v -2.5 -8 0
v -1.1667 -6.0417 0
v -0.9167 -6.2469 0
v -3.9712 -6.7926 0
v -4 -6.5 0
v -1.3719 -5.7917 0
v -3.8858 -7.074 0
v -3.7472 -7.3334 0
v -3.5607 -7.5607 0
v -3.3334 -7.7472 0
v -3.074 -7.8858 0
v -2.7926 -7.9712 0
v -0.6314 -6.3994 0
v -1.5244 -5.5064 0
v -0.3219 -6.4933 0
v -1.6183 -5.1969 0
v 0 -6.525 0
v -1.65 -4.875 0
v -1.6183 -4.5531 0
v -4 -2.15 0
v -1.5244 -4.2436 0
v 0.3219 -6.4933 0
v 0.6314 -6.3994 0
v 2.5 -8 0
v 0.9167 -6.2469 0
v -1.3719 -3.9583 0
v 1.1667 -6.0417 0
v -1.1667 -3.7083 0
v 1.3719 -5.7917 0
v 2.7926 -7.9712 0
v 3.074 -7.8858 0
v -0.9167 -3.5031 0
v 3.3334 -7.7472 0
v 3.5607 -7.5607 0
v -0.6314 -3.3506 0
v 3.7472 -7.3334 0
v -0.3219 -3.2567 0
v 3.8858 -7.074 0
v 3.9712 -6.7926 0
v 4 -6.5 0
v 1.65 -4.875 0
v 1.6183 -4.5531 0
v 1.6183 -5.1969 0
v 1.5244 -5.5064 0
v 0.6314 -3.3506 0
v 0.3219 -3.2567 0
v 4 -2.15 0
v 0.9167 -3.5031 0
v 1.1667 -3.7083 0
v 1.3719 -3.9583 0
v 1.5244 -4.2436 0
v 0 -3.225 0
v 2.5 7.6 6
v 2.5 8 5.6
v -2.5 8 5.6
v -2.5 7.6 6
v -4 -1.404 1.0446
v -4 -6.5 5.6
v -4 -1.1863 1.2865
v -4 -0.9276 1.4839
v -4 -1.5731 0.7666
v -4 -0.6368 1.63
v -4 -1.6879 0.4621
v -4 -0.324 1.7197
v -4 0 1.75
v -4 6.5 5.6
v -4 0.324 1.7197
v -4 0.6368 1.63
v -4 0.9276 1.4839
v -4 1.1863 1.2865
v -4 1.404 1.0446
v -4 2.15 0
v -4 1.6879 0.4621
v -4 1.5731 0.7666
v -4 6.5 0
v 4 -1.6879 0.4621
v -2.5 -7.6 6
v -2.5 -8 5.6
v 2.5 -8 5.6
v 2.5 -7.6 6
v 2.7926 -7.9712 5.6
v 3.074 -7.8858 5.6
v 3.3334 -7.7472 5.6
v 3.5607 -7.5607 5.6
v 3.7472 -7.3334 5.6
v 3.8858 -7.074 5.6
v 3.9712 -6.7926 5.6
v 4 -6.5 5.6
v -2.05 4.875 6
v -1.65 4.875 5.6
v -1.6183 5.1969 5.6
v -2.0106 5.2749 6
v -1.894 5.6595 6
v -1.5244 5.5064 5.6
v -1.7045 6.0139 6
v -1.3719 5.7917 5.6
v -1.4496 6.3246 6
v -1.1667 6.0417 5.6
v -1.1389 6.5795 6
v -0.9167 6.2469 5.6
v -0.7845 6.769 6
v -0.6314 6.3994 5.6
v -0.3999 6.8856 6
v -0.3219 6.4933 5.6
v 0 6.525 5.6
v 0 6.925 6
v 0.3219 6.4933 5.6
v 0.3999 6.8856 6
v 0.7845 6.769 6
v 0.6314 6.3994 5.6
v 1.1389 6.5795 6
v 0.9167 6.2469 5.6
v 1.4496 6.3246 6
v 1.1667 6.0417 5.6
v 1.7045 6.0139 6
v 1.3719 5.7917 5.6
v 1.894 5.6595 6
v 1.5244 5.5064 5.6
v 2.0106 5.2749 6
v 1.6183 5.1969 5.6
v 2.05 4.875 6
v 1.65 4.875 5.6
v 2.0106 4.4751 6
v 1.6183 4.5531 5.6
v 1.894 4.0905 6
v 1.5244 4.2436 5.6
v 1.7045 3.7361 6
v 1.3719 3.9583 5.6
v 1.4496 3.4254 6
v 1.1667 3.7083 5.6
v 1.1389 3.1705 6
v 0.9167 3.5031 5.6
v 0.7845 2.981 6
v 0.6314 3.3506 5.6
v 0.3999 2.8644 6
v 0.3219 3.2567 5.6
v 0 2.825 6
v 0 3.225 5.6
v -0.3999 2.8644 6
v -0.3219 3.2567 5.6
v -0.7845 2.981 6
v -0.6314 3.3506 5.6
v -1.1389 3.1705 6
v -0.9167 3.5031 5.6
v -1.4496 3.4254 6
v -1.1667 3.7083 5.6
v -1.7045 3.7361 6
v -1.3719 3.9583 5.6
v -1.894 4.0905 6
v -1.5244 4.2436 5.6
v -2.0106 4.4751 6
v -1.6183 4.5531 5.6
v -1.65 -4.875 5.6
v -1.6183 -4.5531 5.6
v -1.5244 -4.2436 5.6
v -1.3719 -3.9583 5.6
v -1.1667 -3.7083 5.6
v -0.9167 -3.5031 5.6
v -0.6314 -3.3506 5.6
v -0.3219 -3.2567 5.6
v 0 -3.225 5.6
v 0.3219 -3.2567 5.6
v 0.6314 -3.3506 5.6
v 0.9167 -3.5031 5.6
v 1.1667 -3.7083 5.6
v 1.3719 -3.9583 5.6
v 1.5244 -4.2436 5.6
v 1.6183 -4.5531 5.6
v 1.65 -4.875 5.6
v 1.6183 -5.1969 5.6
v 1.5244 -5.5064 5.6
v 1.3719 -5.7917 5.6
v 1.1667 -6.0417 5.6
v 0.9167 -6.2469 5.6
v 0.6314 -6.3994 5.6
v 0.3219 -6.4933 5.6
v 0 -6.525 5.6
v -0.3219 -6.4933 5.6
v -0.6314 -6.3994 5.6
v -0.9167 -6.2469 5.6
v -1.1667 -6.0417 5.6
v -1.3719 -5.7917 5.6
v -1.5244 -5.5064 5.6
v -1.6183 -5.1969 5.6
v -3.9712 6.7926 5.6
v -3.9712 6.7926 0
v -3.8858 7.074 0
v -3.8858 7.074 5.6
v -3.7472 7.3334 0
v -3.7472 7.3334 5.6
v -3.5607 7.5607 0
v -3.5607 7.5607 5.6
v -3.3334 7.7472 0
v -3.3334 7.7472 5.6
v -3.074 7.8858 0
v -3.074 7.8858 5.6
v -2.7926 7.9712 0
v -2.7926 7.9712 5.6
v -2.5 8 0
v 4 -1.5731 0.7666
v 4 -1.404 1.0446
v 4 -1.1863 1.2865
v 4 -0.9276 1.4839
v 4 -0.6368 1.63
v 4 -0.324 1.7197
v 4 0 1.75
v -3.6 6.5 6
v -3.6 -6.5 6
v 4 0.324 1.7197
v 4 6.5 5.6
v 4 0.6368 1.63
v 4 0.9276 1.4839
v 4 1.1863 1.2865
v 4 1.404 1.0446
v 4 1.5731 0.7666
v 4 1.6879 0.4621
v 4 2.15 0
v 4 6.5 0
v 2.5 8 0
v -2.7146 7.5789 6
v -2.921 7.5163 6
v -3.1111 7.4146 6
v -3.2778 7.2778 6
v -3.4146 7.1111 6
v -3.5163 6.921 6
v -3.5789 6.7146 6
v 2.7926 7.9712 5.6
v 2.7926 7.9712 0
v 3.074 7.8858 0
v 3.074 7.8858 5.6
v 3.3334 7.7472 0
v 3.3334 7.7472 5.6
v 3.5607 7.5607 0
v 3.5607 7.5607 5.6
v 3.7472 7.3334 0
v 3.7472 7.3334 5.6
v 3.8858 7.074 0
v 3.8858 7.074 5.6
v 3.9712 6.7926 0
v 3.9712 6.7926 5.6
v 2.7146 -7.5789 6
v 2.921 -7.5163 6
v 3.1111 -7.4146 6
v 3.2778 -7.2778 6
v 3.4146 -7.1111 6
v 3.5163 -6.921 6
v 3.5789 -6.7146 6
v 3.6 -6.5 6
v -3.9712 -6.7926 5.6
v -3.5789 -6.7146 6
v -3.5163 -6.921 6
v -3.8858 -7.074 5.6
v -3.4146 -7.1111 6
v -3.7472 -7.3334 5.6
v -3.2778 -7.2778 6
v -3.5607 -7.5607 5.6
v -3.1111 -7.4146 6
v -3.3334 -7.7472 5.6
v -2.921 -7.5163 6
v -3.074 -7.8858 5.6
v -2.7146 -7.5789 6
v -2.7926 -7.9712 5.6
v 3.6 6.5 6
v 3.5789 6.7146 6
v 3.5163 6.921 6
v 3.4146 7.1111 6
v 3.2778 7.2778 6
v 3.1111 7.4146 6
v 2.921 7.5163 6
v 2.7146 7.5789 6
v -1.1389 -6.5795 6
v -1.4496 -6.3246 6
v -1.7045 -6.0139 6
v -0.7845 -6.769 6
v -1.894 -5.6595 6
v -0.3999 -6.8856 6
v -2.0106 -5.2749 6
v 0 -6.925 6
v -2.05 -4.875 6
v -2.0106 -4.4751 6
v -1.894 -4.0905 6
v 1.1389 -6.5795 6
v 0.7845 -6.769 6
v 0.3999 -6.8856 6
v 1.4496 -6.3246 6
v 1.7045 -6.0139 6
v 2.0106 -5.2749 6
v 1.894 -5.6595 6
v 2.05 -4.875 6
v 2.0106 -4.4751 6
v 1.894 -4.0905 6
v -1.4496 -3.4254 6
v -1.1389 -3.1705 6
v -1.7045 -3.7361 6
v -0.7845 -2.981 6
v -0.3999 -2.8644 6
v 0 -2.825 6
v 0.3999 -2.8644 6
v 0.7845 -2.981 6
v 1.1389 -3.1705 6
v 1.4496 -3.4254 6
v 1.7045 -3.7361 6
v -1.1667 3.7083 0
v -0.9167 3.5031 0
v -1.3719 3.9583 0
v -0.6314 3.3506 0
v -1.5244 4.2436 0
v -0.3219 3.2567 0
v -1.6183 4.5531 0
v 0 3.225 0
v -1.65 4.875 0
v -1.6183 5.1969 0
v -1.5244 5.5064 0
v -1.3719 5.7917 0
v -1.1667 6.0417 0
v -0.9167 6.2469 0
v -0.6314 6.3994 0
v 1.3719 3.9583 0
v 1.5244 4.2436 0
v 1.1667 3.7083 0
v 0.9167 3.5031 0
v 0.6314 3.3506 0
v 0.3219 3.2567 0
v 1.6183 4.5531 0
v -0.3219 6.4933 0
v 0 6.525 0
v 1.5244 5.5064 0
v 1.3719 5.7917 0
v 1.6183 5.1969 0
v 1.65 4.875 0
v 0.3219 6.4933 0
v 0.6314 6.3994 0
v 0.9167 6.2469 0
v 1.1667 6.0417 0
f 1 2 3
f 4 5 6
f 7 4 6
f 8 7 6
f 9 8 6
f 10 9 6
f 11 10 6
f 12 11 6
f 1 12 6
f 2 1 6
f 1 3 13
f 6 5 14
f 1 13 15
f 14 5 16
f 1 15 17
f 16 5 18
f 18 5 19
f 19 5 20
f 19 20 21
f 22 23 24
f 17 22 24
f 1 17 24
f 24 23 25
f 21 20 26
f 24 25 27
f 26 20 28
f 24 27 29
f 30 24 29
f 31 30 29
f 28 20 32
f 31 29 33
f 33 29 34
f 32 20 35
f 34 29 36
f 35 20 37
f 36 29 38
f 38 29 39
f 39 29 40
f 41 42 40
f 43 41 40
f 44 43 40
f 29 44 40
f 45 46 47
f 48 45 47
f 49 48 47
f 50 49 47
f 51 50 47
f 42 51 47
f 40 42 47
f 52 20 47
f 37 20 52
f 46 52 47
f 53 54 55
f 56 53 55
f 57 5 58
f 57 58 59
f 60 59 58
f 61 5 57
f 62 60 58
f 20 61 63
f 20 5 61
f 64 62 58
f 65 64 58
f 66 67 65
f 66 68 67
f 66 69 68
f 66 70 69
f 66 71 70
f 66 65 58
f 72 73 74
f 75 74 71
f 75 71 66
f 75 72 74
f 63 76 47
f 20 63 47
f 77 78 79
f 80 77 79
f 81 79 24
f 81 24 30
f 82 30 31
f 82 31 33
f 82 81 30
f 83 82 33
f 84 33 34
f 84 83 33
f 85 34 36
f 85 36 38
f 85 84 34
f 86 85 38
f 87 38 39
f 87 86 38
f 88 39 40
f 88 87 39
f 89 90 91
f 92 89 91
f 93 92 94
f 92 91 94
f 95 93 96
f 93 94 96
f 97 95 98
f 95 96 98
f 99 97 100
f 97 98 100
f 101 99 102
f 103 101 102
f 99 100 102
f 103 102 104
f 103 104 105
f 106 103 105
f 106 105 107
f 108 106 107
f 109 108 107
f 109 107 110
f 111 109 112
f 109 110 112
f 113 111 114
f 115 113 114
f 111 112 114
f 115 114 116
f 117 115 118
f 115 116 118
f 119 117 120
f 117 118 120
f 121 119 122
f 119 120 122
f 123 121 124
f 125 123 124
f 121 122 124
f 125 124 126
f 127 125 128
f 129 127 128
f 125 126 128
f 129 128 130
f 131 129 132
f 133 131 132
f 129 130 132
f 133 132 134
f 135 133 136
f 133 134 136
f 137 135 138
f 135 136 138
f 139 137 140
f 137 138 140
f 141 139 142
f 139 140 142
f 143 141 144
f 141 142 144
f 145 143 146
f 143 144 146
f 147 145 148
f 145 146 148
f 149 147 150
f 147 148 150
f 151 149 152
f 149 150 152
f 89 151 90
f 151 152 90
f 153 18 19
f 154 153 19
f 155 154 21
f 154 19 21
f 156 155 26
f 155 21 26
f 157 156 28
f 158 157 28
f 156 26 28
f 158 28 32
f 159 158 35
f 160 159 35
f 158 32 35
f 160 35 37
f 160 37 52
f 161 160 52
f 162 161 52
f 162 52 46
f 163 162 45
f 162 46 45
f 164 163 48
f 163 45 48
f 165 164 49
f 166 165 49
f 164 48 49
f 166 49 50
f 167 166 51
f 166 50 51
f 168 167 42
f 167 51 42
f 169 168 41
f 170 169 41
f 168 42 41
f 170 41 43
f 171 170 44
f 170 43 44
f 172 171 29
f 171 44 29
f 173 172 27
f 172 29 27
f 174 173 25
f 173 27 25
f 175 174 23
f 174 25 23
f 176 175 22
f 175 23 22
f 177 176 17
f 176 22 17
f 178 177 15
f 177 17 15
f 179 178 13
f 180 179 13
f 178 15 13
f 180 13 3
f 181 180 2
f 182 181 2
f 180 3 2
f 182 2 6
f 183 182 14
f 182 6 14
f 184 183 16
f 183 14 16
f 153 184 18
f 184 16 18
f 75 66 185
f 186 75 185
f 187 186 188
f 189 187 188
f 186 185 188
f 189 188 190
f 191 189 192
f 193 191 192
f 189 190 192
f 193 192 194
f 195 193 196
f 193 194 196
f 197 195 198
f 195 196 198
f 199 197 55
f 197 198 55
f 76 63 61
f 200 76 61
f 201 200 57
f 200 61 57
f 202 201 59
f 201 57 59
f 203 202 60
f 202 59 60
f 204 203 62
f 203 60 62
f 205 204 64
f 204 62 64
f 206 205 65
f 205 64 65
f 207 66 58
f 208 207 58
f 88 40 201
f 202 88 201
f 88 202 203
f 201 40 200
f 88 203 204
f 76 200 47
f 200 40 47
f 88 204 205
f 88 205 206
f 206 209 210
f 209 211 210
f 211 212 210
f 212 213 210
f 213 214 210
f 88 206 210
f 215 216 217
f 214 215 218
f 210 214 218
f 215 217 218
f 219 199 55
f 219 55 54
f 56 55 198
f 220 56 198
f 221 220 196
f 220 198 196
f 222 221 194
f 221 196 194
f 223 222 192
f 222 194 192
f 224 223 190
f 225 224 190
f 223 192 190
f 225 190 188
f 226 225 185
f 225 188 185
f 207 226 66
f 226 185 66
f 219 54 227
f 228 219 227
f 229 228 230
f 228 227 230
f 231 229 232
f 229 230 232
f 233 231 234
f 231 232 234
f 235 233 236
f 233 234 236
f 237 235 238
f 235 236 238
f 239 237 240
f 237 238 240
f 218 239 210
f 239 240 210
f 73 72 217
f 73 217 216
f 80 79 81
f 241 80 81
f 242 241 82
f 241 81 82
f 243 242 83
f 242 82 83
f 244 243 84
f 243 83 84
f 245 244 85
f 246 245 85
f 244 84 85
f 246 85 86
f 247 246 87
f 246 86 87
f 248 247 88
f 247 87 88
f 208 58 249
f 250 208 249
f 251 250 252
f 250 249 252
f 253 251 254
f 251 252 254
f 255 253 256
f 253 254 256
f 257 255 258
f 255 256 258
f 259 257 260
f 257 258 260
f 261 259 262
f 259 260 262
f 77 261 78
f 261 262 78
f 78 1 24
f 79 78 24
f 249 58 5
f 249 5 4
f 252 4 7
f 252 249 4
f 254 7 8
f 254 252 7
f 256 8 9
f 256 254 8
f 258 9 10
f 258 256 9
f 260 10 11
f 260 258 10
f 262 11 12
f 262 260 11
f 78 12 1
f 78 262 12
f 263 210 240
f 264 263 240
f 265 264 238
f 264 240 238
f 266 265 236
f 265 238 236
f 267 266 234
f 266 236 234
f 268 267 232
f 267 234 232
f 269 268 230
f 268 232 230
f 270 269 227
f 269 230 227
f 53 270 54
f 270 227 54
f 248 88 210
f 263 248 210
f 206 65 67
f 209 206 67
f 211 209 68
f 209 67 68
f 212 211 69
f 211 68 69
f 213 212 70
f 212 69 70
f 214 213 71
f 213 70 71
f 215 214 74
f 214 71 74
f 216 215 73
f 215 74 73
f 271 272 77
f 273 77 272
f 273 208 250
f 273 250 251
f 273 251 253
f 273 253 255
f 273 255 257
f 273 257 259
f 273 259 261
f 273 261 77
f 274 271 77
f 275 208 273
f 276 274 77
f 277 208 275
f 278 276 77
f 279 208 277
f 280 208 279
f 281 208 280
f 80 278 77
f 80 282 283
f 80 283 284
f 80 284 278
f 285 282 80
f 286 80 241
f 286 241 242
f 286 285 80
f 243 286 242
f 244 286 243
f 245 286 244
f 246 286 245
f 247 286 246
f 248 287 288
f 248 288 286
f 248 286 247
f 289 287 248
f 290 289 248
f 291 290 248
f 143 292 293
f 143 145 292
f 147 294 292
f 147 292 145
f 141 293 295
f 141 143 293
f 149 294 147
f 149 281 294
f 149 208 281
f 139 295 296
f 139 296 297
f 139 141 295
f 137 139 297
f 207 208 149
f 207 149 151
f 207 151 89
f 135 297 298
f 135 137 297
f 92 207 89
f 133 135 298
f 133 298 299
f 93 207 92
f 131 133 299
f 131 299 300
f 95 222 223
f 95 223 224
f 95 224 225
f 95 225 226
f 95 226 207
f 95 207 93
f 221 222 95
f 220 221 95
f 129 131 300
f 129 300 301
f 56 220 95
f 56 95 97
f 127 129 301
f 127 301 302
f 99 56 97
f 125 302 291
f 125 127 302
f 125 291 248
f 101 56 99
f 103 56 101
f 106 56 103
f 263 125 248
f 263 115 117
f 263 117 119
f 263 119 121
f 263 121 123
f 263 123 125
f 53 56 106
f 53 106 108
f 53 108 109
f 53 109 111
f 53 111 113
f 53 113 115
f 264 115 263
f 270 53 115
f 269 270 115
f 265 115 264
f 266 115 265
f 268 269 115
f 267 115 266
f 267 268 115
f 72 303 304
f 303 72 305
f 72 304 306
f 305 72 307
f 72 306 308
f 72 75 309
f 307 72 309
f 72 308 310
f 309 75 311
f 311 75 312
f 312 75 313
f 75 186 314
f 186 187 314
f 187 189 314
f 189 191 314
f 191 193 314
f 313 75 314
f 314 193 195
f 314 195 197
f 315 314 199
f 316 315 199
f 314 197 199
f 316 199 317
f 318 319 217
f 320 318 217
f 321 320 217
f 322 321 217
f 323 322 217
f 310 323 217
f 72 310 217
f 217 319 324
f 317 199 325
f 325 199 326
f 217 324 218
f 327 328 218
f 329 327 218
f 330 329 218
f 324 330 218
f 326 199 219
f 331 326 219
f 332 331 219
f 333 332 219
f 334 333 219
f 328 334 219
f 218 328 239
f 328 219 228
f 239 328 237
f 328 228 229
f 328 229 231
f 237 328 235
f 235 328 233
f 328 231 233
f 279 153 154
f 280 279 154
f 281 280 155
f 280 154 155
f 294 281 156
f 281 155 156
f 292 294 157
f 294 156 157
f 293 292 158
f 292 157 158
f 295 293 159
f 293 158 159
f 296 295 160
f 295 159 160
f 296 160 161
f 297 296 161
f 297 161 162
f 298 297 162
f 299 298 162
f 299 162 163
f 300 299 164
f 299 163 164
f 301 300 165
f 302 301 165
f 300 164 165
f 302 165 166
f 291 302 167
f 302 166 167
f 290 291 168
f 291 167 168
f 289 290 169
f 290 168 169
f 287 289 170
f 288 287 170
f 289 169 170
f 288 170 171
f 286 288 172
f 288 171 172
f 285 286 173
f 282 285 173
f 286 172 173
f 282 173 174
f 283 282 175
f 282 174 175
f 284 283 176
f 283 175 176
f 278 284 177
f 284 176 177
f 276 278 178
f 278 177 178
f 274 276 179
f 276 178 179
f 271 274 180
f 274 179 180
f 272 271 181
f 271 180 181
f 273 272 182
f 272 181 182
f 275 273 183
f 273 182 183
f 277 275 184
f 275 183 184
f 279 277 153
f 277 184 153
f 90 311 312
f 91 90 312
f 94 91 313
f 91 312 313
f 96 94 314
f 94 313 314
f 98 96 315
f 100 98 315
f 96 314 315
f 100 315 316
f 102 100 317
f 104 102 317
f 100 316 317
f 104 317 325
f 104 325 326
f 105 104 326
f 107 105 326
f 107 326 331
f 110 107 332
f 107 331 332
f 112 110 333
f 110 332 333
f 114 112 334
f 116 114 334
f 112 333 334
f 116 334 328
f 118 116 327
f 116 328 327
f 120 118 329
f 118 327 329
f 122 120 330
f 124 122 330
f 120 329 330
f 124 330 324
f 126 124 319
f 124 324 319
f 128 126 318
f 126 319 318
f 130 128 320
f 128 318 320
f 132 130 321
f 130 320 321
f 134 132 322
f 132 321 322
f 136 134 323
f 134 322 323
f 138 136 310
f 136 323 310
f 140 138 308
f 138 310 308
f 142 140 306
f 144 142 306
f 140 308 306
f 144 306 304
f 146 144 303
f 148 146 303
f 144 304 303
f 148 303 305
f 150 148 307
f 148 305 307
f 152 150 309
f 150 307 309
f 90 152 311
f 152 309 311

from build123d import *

# Parameters (mm, degrees)
SKETCH2_W           = 8
SKETCH2_H           = 16
BOSS_EXTRUDE1_DEPTH = 6
CUT_EXTRUDE1_DEPTH  = 8
SKETCH4_R           = 1.65
CUT_EXTRUDE2_DEPTH  = 6
FILLET1_R           = 1.5
CHAMFER1_SIZE       = 0.4
CHAMFER2_SIZE       = 0.4


with BuildPart() as part:
    # Sketch2 → Boss-Extrude1 (new body)
    with BuildSketch(Plane.XY):
        Rectangle(SKETCH2_W, SKETCH2_H)
    extrude(amount=BOSS_EXTRUDE1_DEPTH)

    # Sketch3 → Cut-Extrude1 (cut)
    with BuildSketch(Plane.ZY.offset(4)):
        with BuildLine():
            ThreePointArc((0, 1.75), (-1.75, 0), (0, -1.75))
            Line((0, -1.75), (0, 1.75))
        make_face()
        with BuildLine():
            Line((0, 1.75), (0, -1.75))
            ThreePointArc((0, -1.75), (1.237436867, -1.237436867), (1.75, 0))
            ThreePointArc((1.75, 0), (1.237436867, 1.237436867), (0, 1.75))
        make_face()
    extrude(amount=-CUT_EXTRUDE1_DEPTH, mode=Mode.SUBTRACT)

    # Sketch4 → Cut-Extrude2 (cut)
    with BuildSketch(Plane(origin=(0, 0, 0), x_dir=(-1, 0, 0), z_dir=(0, 0, -1))):
        with Locations((0, -4.875)):
            Circle(SKETCH4_R)
        with Locations((0, 4.875)):
            Circle(SKETCH4_R)
    extrude(amount=-CUT_EXTRUDE2_DEPTH, mode=Mode.SUBTRACT)

    # Fillet1
    fillet1_edges = [part.edges().sort_by_distance(p)[0] for p in [
        (4, -8, 3),
        (-4, -8, 3),
        (-4, 8, 3),
        (4, 8, 3),
    ]]
    fillet(fillet1_edges, radius=FILLET1_R)

    # Chamfer1
    chamfer1_edges = [part.edges().sort_by_distance(p)[0] for p in [
        (1.65, -4.875, 6),
        (1.65, 4.875, 6),
        (4, 0, 6),
        (0, -8, 6),
        (0, 8, 6),
        (-4, 0, 6),
        (3.560660172, 7.560660172, 6),
        (-3.560660172, 7.560660172, 6),
        (-3.560660172, -7.560660172, 6),
        (3.560660172, -7.560660172, 6),
    ]]
    chamfer(chamfer1_edges, length=CHAMFER1_SIZE)

    # Chamfer2
    # the kernel refuses this chamfer: 0.4 mm, written as the material it takes off along each edge
    with BuildSketch(Plane(origin=(5.197730184, -1.75, 0), x_dir=(0, 0.1332210476636025, 0.9910863496484109), z_dir=(-1, 0, 0))) as chamfer2_piece_1:
        with BuildLine():
            Line((0.466273667, 0), (-CHAMFER2_SIZE * 0.133221047664, -CHAMFER2_SIZE * 0.991086349648))
            Line((-CHAMFER2_SIZE * 0.133221047664, -CHAMFER2_SIZE * 0.991086349648), (0, 0))
            ThreePointArc((0, 0), (0.23957204, -0.015587056), (0.466273667, 0))
        make_face()
    extrude(amount=10.395460367, mode=Mode.SUBTRACT)
    with BuildSketch(Plane(origin=(-5.197730184, 1.75, 0), x_dir=(0, 1, 0), z_dir=(1, 0, 0))) as chamfer2_piece_2:
        with BuildLine():
            Line((CHAMFER2_SIZE, 0), (-0.062117466, 0.462117466))
            ThreePointArc((-0.062117466, 0.462117466), (-0.01646792, 0.239513102), (0, 0))
            Line((0, 0), (CHAMFER2_SIZE, 0))
        make_face()
    extrude(amount=10.395460367, mode=Mode.SUBTRACT)


solid = part.part
